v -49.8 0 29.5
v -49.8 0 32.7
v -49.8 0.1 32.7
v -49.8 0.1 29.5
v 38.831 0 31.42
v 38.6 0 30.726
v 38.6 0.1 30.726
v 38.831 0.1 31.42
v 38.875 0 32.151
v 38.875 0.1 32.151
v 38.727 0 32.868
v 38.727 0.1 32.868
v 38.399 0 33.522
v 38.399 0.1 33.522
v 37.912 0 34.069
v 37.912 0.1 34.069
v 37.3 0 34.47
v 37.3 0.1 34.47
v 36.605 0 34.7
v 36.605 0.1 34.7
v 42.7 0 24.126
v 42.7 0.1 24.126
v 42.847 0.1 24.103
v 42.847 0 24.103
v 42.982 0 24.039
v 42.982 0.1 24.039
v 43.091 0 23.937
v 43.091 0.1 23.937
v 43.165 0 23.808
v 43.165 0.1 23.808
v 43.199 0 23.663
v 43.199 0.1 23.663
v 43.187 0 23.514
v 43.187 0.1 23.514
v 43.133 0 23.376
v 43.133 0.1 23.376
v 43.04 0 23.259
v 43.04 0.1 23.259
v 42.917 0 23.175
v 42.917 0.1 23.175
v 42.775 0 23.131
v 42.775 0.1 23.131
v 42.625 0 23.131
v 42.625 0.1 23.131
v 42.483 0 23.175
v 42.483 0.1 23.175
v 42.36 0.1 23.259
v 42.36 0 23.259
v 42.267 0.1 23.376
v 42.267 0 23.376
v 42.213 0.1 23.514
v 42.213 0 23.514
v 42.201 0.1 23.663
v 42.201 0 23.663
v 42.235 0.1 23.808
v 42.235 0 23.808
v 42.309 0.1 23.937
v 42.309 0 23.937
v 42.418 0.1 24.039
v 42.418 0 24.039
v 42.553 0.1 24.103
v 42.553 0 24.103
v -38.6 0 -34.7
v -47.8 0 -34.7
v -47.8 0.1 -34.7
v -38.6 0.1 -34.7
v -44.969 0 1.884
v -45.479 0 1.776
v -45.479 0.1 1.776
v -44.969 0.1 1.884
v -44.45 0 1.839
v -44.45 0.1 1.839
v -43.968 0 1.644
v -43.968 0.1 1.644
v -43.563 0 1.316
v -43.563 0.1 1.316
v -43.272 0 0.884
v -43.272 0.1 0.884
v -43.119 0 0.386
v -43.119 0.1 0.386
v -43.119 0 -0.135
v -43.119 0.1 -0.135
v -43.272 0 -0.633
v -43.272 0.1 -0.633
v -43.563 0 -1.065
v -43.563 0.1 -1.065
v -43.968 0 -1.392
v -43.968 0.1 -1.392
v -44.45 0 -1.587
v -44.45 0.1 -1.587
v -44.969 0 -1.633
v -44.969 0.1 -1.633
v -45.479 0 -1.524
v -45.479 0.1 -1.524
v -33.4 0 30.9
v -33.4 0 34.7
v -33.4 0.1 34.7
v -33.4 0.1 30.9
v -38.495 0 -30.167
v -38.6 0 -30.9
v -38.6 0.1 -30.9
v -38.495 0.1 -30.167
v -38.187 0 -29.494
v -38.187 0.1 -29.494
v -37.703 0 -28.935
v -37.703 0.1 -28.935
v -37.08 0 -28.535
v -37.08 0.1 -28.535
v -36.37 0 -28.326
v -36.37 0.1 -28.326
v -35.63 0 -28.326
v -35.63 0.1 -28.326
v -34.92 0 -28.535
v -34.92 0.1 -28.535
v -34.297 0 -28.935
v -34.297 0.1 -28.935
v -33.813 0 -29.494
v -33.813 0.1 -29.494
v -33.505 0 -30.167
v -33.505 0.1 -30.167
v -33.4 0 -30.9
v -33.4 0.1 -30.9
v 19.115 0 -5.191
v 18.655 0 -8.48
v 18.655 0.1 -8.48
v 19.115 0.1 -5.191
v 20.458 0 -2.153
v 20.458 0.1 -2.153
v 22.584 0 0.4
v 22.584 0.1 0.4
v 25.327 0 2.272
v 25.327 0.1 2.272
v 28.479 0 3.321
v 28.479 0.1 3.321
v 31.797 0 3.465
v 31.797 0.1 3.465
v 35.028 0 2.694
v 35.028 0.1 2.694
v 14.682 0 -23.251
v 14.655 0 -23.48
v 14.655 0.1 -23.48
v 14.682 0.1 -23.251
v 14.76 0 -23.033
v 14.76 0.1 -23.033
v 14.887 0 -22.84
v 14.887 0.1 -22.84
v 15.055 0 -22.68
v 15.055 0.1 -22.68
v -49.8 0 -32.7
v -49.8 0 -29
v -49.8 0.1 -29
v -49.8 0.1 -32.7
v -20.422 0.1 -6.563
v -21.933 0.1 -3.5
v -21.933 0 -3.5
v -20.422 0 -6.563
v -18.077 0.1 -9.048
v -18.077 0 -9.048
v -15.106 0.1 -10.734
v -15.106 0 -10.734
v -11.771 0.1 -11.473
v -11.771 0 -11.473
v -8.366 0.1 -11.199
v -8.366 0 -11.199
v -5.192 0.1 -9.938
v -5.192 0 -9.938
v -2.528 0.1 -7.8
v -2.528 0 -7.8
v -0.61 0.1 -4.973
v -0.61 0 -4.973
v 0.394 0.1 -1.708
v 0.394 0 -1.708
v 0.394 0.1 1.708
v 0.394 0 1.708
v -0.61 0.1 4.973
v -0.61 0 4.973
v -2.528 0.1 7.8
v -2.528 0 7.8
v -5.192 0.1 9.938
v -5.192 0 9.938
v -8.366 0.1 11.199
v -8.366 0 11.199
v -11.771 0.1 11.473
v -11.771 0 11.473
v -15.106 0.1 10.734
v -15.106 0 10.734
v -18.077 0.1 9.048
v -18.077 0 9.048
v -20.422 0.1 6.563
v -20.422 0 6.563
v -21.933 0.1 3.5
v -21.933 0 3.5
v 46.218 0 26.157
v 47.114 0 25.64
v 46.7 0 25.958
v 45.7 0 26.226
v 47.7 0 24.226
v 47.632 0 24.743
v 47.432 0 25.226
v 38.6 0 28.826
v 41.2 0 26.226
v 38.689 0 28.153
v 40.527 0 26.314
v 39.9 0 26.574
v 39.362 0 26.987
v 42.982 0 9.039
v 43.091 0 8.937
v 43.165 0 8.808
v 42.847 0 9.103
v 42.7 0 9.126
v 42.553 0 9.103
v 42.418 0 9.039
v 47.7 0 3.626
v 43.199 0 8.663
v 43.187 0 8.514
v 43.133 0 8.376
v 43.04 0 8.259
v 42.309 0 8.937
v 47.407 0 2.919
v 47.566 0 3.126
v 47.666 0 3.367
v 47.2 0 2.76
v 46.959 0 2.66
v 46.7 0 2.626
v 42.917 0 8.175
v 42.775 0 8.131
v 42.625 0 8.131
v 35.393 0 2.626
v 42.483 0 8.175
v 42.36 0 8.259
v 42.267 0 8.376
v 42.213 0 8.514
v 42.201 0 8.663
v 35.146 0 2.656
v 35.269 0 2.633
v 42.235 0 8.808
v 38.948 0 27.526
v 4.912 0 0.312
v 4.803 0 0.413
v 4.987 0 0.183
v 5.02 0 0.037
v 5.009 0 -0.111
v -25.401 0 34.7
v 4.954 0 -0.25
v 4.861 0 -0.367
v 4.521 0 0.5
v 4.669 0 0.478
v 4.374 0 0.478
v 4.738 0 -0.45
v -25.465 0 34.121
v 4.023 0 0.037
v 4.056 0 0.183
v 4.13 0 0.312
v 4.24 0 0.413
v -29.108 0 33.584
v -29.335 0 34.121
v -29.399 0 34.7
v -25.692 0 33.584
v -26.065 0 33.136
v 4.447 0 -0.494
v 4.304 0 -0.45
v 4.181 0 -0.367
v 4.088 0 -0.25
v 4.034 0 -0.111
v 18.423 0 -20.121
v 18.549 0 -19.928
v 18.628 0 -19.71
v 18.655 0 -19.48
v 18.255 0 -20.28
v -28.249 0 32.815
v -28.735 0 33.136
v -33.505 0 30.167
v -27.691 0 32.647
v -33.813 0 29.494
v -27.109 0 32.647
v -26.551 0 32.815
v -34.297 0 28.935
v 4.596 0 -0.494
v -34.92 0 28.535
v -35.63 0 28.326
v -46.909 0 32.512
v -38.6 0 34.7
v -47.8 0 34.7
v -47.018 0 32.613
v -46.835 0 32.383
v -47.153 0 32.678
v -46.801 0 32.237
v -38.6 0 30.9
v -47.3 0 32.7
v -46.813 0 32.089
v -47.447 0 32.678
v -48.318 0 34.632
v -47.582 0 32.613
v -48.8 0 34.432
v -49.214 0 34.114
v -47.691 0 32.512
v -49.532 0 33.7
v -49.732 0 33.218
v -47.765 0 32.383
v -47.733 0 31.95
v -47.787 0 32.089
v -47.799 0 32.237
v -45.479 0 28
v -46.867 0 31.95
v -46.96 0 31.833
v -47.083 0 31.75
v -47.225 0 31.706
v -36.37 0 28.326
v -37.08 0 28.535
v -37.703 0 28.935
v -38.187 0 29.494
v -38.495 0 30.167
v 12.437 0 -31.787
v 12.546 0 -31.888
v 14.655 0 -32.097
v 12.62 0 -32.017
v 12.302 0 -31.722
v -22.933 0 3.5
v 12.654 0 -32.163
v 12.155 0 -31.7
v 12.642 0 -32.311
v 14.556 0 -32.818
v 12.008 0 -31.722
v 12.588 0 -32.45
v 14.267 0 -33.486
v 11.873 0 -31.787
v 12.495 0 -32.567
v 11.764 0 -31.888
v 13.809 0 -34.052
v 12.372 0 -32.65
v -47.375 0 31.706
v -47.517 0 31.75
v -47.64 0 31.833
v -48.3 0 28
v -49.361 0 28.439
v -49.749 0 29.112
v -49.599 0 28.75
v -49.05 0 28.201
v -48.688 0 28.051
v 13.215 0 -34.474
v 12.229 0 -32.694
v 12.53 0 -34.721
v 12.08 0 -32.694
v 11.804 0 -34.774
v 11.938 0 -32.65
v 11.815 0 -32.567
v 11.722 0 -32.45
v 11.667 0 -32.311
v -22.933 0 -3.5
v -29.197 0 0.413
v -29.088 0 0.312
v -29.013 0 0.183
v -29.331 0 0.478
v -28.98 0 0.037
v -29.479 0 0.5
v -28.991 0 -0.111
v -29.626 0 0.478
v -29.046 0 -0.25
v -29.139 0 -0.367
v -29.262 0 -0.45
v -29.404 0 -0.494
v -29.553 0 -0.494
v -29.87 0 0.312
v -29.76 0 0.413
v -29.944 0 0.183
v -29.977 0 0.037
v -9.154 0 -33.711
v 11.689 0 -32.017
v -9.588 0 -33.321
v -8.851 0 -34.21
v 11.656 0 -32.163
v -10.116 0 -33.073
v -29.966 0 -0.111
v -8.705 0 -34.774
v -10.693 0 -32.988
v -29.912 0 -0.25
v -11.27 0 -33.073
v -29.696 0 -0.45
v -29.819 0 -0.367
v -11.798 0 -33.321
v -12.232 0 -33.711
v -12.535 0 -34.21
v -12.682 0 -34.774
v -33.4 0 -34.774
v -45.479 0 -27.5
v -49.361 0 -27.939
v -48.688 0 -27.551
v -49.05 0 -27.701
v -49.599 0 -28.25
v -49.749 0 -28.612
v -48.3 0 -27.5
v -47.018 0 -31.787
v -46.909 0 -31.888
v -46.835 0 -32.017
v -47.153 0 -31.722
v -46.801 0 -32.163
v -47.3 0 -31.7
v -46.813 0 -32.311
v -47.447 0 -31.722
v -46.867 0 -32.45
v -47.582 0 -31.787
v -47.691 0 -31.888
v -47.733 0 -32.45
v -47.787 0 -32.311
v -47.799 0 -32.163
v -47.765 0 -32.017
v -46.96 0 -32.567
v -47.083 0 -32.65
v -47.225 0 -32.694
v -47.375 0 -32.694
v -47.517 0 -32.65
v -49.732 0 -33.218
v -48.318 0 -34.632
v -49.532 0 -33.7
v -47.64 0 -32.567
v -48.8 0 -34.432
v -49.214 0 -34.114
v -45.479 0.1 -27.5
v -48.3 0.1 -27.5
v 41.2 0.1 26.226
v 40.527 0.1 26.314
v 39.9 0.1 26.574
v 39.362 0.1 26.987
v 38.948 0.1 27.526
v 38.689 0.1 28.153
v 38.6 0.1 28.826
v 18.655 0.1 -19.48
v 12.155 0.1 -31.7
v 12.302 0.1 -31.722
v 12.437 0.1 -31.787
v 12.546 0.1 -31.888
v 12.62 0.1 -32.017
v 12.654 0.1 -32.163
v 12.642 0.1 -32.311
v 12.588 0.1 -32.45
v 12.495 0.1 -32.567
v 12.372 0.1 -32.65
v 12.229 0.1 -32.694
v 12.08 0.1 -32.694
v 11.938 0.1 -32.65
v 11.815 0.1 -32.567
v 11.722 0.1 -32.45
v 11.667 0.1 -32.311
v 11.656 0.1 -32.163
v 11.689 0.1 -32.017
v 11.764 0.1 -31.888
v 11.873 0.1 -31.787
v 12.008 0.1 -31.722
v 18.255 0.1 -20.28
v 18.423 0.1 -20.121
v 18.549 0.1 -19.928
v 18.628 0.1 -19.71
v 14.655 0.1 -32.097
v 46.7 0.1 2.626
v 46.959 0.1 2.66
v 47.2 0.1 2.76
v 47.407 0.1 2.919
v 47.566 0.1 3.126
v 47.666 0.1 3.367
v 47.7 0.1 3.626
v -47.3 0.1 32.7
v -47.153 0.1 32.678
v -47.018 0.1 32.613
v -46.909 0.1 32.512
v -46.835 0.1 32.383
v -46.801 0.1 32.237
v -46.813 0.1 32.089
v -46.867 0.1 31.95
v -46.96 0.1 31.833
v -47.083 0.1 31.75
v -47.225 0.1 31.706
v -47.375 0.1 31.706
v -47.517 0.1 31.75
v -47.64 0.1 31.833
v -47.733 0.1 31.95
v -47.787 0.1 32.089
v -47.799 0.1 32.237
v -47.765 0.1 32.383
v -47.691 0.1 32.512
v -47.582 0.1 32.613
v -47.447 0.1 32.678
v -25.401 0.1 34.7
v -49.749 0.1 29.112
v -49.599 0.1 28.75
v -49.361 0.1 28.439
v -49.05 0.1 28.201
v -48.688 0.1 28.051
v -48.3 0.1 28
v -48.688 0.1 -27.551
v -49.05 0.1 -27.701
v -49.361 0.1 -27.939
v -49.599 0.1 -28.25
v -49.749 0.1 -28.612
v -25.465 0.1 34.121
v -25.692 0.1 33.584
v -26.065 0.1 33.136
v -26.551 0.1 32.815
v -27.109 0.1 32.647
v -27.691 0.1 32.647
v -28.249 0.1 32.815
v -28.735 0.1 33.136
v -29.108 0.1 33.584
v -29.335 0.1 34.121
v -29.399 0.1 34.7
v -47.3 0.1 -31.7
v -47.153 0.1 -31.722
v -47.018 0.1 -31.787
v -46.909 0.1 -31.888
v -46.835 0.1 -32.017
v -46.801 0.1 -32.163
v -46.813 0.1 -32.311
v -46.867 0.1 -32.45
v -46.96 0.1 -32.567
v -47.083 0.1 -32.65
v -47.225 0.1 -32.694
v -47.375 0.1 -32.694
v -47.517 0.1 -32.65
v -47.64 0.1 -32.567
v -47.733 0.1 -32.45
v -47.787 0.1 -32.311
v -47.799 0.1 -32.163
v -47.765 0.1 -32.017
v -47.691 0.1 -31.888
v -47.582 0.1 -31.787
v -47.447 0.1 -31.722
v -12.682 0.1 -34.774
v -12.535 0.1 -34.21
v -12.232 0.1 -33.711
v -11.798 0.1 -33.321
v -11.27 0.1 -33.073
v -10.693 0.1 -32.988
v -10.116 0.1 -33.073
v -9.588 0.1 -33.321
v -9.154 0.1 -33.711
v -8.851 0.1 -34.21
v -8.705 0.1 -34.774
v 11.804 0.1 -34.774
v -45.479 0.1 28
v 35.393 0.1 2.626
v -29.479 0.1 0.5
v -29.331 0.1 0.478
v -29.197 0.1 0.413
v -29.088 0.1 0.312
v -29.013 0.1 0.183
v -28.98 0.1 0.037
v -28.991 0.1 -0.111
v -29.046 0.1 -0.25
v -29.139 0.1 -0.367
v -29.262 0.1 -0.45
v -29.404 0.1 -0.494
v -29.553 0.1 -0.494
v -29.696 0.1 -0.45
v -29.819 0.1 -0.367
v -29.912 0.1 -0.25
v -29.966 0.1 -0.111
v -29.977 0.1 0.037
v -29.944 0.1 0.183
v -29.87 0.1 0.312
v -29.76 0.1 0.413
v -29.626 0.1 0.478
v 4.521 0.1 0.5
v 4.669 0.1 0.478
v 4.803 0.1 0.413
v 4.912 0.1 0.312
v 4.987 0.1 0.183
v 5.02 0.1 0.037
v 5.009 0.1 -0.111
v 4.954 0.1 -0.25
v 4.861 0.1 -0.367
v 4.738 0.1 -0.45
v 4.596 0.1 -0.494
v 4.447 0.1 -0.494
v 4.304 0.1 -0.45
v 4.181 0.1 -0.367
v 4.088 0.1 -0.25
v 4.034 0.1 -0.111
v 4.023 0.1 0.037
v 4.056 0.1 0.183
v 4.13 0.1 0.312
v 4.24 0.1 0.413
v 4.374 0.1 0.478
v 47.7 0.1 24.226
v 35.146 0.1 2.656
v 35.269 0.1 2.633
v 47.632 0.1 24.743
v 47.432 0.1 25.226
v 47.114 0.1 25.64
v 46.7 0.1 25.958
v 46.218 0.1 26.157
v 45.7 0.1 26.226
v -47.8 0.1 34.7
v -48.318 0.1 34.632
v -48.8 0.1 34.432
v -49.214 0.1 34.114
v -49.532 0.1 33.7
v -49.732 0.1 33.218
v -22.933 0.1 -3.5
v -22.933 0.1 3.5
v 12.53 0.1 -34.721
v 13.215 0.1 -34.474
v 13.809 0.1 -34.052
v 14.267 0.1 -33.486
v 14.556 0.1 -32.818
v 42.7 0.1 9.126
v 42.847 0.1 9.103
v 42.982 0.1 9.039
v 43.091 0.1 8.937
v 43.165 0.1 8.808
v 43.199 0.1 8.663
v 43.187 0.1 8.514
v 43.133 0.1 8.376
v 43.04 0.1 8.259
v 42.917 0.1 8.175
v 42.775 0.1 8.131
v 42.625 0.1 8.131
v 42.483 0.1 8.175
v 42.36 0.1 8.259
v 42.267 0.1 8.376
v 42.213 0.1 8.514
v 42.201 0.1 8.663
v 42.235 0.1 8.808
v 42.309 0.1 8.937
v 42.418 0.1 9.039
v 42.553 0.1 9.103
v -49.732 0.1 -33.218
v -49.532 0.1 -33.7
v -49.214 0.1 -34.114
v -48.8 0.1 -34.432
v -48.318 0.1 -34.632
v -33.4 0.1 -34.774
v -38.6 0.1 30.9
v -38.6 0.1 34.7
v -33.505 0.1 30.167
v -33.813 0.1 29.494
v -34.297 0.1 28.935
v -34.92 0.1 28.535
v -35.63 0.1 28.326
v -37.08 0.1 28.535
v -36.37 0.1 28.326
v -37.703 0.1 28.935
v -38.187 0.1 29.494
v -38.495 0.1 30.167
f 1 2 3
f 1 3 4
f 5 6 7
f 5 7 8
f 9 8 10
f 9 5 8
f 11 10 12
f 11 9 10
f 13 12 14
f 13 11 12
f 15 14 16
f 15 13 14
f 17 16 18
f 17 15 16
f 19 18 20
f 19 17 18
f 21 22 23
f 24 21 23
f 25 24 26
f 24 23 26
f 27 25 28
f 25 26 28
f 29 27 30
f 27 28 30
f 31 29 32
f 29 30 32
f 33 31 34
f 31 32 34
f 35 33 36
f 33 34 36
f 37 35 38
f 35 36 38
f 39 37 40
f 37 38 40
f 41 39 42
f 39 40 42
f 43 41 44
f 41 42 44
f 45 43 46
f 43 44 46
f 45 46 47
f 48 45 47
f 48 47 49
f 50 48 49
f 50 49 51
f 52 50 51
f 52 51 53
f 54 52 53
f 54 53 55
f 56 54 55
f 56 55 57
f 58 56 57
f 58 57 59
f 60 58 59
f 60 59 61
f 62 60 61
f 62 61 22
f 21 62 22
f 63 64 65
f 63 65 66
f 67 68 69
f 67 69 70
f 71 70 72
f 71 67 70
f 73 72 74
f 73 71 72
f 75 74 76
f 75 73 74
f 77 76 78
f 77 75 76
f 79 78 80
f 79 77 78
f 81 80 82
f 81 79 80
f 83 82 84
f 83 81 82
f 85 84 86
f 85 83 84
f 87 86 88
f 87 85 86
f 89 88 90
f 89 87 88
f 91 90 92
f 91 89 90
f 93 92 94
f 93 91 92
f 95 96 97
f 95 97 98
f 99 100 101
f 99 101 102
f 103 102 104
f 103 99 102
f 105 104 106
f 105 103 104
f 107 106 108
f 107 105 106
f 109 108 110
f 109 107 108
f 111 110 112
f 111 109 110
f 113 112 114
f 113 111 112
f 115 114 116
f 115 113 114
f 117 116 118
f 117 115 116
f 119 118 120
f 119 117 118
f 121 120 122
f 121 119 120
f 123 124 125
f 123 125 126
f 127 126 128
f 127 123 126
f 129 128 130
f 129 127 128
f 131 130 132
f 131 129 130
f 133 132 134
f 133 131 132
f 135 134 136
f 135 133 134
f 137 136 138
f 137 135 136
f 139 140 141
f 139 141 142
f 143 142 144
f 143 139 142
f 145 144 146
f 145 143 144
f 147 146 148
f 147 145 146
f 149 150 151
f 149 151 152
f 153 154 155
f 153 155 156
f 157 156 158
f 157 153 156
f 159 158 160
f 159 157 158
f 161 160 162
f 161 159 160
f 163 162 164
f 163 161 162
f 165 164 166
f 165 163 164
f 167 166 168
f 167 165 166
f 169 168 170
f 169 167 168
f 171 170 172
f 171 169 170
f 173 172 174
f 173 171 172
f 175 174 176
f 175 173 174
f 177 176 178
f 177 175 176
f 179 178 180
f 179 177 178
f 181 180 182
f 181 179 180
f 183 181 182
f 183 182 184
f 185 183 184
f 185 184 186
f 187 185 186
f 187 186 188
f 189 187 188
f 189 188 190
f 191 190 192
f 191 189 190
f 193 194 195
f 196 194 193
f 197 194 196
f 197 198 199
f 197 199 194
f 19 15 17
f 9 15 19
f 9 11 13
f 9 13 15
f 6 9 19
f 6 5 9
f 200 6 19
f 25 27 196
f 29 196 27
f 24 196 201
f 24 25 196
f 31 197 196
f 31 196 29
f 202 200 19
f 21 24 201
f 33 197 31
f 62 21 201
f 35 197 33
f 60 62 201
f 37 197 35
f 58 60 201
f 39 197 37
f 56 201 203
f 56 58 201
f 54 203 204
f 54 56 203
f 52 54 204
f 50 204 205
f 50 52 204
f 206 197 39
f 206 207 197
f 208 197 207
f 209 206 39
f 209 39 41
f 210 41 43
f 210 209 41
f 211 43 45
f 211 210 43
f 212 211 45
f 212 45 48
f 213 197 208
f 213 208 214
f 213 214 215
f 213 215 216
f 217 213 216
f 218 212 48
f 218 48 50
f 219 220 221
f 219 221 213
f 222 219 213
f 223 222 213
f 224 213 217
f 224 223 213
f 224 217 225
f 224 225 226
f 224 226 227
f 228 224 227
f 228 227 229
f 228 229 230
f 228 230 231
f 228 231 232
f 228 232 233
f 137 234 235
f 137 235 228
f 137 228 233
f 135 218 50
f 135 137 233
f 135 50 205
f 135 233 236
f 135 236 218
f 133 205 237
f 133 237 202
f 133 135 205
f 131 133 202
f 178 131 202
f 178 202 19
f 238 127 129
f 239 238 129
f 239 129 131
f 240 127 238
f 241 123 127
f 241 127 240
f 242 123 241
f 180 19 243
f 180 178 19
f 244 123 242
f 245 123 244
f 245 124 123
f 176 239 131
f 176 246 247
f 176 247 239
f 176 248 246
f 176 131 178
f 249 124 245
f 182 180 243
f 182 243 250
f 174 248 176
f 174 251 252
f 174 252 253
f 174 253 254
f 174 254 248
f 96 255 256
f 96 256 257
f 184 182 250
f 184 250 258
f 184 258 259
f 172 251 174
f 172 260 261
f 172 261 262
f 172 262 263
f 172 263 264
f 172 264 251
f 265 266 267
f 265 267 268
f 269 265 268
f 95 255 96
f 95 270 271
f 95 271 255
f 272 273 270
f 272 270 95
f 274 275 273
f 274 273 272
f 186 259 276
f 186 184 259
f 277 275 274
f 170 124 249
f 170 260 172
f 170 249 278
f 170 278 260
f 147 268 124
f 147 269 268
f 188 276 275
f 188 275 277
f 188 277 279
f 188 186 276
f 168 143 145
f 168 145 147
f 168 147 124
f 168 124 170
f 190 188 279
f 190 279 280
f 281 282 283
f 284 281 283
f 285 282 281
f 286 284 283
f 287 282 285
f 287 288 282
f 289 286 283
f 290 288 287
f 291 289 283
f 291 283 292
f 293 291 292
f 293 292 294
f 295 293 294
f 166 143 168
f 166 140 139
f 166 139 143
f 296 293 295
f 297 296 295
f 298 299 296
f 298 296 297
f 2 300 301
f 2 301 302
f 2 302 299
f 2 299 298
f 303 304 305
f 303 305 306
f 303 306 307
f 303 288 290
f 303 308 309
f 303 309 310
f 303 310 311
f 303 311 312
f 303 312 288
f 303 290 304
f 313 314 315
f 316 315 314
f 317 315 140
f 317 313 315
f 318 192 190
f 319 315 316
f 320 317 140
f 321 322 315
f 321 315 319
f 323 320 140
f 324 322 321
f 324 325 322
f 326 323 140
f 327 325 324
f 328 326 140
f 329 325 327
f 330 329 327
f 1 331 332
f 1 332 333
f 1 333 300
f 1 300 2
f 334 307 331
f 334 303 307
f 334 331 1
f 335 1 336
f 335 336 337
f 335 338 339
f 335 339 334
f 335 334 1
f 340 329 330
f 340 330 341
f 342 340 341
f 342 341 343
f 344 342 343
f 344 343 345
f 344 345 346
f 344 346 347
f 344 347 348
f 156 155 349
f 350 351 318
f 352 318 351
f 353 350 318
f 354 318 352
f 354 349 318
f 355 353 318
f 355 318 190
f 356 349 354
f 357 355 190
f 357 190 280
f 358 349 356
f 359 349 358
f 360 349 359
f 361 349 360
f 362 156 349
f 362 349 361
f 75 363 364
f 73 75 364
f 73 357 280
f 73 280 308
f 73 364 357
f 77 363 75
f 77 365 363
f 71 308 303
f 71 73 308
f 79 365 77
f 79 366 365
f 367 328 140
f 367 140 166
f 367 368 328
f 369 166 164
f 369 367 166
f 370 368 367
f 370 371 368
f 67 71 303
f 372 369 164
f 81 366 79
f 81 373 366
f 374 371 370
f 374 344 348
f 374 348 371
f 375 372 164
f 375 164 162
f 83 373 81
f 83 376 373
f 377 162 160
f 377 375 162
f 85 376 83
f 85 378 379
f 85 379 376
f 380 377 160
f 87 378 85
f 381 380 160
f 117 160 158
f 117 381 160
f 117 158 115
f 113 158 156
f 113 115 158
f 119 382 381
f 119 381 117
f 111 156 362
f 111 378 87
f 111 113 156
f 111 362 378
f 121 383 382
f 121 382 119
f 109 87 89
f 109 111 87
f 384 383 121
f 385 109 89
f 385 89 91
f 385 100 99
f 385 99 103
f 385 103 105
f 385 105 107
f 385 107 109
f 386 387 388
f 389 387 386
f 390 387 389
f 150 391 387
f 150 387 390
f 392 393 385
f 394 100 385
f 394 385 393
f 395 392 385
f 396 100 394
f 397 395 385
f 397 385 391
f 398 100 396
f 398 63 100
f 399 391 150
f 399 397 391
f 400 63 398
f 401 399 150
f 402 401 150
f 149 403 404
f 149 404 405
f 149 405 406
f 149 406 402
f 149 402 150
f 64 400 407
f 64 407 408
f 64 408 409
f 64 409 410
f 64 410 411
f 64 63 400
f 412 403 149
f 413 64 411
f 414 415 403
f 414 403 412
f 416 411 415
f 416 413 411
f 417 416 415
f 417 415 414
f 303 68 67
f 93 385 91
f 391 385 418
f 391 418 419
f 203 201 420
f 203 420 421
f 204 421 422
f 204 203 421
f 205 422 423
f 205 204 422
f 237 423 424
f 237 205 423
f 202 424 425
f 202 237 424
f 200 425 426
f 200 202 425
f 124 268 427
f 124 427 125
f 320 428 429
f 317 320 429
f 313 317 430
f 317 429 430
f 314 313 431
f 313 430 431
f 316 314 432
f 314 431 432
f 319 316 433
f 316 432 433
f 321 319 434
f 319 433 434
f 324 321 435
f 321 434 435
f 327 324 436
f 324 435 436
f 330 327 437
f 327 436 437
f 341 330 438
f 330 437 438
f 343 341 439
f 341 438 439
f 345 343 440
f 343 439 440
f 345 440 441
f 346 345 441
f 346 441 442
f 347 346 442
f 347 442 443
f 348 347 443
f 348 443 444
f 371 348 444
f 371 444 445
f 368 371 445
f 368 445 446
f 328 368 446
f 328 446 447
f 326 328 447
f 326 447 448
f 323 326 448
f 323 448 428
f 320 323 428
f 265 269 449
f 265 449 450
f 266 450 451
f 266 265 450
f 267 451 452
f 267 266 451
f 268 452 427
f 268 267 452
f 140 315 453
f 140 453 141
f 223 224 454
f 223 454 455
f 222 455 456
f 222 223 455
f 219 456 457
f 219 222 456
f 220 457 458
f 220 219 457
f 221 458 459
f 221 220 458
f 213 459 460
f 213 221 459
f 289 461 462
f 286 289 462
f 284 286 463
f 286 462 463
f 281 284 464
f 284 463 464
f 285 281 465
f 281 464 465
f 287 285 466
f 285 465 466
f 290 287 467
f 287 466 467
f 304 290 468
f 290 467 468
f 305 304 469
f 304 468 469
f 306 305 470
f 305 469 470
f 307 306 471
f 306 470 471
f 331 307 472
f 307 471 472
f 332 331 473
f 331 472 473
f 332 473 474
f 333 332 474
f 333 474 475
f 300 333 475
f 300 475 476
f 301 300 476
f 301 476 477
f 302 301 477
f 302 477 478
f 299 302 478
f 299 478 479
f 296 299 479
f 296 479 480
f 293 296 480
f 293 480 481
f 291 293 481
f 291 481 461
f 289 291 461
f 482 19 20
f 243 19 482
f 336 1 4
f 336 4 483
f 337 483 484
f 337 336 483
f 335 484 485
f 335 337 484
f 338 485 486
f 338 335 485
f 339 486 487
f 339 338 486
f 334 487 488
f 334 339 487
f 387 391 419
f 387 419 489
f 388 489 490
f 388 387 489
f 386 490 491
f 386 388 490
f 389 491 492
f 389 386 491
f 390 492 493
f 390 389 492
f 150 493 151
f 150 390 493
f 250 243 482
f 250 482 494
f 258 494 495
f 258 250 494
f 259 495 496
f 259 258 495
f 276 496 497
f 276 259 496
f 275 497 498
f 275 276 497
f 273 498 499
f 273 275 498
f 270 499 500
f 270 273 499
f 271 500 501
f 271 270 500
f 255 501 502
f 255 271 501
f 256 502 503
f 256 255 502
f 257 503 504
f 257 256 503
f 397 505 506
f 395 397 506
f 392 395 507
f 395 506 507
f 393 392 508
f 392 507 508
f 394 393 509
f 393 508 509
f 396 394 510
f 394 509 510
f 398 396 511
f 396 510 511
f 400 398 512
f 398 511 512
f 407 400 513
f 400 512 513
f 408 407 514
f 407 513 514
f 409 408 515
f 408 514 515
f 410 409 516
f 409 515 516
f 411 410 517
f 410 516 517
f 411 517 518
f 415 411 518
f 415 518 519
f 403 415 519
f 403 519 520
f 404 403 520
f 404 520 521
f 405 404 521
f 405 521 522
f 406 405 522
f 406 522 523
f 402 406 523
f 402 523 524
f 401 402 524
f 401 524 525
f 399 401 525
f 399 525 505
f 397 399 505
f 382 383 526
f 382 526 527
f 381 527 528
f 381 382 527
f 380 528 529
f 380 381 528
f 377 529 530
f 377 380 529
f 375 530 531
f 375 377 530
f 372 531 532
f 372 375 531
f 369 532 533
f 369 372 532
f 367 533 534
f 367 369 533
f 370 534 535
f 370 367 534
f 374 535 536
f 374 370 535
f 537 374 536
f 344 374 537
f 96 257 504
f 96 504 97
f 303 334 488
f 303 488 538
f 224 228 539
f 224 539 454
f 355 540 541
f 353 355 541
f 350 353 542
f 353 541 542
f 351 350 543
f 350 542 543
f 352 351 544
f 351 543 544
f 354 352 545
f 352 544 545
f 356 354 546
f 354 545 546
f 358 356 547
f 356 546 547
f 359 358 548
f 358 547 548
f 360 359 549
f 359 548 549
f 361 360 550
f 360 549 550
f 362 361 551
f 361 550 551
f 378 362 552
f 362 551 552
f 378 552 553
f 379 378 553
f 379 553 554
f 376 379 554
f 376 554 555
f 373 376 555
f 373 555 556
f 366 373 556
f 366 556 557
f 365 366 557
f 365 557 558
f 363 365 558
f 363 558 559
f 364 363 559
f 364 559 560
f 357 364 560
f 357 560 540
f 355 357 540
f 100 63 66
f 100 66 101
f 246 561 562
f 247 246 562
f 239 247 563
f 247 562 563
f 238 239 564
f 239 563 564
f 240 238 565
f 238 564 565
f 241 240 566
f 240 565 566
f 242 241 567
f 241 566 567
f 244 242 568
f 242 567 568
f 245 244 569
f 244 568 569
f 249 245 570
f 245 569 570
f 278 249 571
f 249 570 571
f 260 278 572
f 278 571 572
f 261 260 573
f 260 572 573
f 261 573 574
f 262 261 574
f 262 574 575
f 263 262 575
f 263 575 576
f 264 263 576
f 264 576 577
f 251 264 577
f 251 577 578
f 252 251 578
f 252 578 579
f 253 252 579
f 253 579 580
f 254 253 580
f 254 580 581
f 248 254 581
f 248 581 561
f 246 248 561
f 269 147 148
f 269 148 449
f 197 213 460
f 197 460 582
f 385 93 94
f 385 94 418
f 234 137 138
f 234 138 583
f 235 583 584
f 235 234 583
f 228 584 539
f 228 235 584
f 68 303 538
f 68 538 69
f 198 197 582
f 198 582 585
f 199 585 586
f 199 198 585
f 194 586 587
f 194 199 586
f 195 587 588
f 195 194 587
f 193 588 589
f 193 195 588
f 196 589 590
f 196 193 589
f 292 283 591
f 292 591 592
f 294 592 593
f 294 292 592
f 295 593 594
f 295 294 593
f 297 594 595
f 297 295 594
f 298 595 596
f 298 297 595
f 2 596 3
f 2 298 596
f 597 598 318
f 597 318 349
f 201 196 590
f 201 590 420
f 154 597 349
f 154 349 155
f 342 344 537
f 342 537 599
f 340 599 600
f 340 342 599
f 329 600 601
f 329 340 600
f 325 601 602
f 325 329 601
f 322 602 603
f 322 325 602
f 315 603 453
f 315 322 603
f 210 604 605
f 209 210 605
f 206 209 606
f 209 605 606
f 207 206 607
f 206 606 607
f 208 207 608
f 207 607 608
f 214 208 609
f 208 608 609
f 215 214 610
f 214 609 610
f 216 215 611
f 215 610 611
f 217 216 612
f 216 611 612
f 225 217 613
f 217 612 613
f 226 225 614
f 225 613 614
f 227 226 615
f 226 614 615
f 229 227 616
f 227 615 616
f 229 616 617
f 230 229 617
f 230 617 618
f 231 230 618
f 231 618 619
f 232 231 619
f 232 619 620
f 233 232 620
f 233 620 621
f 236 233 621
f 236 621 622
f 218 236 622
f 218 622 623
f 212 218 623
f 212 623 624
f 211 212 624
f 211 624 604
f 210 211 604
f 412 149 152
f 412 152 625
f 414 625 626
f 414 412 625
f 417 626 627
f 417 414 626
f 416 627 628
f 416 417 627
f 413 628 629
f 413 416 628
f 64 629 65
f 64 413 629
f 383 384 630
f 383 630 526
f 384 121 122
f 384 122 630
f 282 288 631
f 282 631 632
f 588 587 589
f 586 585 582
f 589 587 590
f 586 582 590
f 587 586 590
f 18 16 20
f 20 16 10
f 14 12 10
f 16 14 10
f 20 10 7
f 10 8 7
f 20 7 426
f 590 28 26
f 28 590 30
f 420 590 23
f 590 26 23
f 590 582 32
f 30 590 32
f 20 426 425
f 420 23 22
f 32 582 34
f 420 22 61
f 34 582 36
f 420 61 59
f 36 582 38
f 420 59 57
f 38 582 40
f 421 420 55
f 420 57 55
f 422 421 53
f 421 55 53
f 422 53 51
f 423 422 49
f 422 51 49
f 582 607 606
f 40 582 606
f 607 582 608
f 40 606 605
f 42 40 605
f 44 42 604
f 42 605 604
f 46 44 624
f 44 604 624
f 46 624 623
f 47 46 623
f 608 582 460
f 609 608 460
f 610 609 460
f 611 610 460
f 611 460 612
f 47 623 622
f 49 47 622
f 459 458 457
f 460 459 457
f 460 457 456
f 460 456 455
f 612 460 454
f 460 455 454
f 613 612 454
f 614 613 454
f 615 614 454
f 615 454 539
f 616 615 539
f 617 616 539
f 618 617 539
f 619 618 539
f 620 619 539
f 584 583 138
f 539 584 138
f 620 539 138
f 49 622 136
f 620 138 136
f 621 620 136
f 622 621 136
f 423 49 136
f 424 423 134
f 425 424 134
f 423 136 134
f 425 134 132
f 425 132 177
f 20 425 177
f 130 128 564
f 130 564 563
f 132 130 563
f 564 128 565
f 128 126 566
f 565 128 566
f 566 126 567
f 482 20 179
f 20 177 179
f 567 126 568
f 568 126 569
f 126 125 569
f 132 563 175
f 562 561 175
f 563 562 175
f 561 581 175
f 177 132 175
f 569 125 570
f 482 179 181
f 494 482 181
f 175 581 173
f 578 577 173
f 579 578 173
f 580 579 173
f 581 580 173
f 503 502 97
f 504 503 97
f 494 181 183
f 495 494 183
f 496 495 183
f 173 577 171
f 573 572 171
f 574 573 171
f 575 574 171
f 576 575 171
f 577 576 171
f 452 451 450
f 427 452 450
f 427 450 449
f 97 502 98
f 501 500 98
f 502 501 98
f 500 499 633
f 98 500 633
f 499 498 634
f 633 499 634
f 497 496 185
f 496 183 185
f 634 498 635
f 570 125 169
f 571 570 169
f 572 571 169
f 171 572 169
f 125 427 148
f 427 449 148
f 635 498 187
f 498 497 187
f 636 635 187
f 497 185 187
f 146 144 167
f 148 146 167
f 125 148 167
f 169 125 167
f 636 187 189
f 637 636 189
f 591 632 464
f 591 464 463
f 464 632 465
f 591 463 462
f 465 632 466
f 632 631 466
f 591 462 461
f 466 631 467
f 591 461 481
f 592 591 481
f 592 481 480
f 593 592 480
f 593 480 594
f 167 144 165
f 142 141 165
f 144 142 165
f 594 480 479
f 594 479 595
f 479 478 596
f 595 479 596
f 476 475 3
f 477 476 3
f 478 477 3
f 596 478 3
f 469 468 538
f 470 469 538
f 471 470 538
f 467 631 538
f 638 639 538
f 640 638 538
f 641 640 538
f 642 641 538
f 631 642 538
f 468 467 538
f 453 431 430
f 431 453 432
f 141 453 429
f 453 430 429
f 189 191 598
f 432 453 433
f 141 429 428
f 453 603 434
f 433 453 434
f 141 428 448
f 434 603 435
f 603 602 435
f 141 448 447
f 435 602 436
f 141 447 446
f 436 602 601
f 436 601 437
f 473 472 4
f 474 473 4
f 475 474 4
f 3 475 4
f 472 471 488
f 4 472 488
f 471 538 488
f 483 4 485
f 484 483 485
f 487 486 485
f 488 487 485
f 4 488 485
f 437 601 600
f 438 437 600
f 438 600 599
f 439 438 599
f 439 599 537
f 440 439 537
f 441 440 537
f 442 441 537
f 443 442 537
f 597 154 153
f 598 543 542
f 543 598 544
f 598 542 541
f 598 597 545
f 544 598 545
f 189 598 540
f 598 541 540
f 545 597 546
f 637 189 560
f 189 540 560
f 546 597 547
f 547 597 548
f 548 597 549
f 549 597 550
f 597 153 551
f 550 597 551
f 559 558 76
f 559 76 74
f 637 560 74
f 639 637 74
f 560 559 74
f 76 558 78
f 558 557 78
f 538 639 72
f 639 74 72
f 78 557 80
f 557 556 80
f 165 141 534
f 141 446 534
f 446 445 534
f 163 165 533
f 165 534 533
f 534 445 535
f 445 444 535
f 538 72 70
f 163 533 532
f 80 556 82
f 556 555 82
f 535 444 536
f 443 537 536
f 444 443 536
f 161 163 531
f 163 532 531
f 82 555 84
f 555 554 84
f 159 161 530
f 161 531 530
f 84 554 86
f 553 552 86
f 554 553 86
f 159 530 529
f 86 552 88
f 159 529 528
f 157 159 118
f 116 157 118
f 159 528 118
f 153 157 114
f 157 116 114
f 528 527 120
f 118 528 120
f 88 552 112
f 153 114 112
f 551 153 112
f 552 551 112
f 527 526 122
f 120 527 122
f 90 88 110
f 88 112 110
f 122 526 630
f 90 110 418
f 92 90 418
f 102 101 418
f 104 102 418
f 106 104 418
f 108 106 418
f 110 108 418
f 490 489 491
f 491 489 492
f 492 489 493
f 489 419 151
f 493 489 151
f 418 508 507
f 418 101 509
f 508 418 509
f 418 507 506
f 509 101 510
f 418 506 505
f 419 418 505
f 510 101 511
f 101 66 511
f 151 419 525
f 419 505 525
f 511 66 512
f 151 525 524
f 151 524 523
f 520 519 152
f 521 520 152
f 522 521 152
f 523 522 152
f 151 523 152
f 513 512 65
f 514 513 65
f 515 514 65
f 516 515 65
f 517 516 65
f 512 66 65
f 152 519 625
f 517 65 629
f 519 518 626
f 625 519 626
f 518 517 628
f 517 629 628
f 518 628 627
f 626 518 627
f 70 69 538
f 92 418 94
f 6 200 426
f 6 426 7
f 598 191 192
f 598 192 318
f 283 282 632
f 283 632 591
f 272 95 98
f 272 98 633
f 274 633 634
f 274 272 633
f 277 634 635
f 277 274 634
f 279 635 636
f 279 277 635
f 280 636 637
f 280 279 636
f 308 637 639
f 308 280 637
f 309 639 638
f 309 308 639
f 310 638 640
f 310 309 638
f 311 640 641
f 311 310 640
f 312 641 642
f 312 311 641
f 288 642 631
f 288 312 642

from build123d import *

# Parameters (mm, degrees)
EXTRUIR1_DEPTH = 0.1
CROQUIS2_R     = 0.5
EXTRUIR2_DEPTH = 61.742680558


with BuildPart() as part:
    # Croquis1 → Extruir1 (new body)
    with BuildSketch(Plane(origin=(0, 0, 0), x_dir=(1, 0, 0), z_dir=(0, 1, 0))):
        with BuildLine():
            Line((-33.4, 34.774386262), (-12.68172335, 34.774386262))
            ThreePointArc((-12.68172335, 34.774386262), (-10.693196053, 32.988300237), (-8.704668756, 34.774386262))
            Line((-8.704668756, 34.774386262), (11.804147498, 34.774386262))
            ThreePointArc((11.804147498, 34.774386262), (13.808796801, 34.052242285), (14.654898518, 32.096680311))
            Line((14.654898518, 32.096680311), (14.654898518, 23.480332981))
            ThreePointArc((14.654898518, 23.480332981), (14.760471327, 23.033119386), (15.054898518, 22.680332981))
            Line((15.054898518, 22.680332981), (18.254898518, 20.280332981))
            ThreePointArc((18.254898518, 20.280332981), (18.549325709, 19.927546577), (18.654898518, 19.480332981))
            Line((18.654898518, 19.480332981), (18.654898518, 8.480332981))
            ThreePointArc((18.654898518, 8.480332981), (23.890263788, -1.431262096), (35.028184679, -2.694387067))
            ThreePointArc((35.028184679, -2.694387067), (35.207188776, -2.642957473), (35.392625193, -2.625613738))
            Line((35.392625193, -2.625613738), (46.7, -2.625613738))
            ThreePointArc((46.7, -2.625613738), (47.407106781, -2.918506956), (47.7, -3.625613738))
            Line((47.7, -3.625613738), (47.7, -24.225613738))
            ThreePointArc((47.7, -24.225613738), (47.114213562, -25.6398273), (45.7, -26.225613738))
            Line((45.7, -26.225613738), (41.2, -26.225613738))
            ThreePointArc((41.2, -26.225613738), (39.361522369, -26.987136107), (38.6, -28.825613738))
            Line((38.6, -28.825613738), (38.6, -30.725613738))
            ThreePointArc((38.6, -30.725613738), (38.584277466, -33.205559421), (36.605129886, -34.7))
            Line((36.605129886, -34.7), (-25.401383808, -34.7))
            ThreePointArc((-25.401383808, -34.7), (-27.4, -32.625613738), (-29.398616192, -34.7))
            Line((-29.398616192, -34.7), (-33.4, -34.7))
            Line((-33.4, -34.7), (-33.4, -30.9))
            ThreePointArc((-33.4, -30.9), (-36, -28.3), (-38.6, -30.9))
            Line((-38.6, -30.9), (-38.6, -34.7))
            Line((-38.6, -34.7), (-47.8, -34.7))
            ThreePointArc((-47.8, -34.7), (-49.214213562, -34.114213562), (-49.8, -32.7))
            Line((-49.8, -32.7), (-49.8, -29.5))
            ThreePointArc((-49.8, -29.5), (-49.360660172, -28.439339828), (-48.3, -28))
            Line((-48.3, -28), (-45.478700604, -28))
            Line((-45.478700604, -28), (-45.478700604, -1.775613738))
            ThreePointArc((-45.478700604, -1.775613738), (-43.1, -0.125613738), (-45.478700604, 1.524386262))
            Line((-45.478700604, 1.524386262), (-45.478700604, 27.5))
            Line((-45.478700604, 27.5), (-48.3, 27.5))
            ThreePointArc((-48.3, 27.5), (-49.360660172, 27.939339828), (-49.8, 29))
            Line((-49.8, 29), (-49.8, 32.7))
            ThreePointArc((-49.8, 32.7), (-49.214213562, 34.114213562), (-47.8, 34.7))
            Line((-47.8, 34.7), (-38.6, 34.7))
            Line((-38.6, 34.7), (-38.6, 30.9))
            ThreePointArc((-38.6, 30.9), (-36, 28.3), (-33.4, 30.9))
            Line((-33.4, 30.9), (-33.4, 34.774386262))
        make_face()
    extrude(amount=EXTRUIR1_DEPTH)

    # Croquis2 → Extruir2 (cut, through all)
    with BuildSketch(Plane(origin=(0, 0.1, 0), x_dir=(1, 0, 0), z_dir=(0, 1, 0))):
        with Locations(Location((-29.478700604, 0, 0), (0, 0, 270))):
            Circle(CROQUIS2_R)
        with Locations(Location((-47.3, 32.2, 0), (0, 0, 270))):
            Circle(CROQUIS2_R)
        with Locations(Location((-47.3, -32.2, 0), (0, 0, 270))):
            Circle(CROQUIS2_R)
        with Locations(Location((12.154898518, 32.2, 0), (0, 0, 270))):
            Circle(CROQUIS2_R)
        with Locations(Location((4.521299396, 0, 0), (0, 0, 270))):
            Circle(CROQUIS2_R)
        with Locations(Location((42.7, -8.625613738, 0), (0, 0, 270))):
            Circle(CROQUIS2_R)
        with Locations(Location((42.7, -23.625613738, 0), (0, 0, 270))):
            Circle(CROQUIS2_R)
        with BuildLine():
            Line((-22.933151754, 3.5), (-21.933151754, 3.5))
            ThreePointArc((-21.933151754, 3.5), (0.521299396, 0), (-21.933151754, -3.5))
            Line((-21.933151754, -3.5), (-22.933151754, -3.5))
            Line((-22.933151754, -3.5), (-22.933151754, 3.5))
        make_face()
    extrude(amount=-EXTRUIR2_DEPTH, mode=Mode.SUBTRACT)


solid = part.part
